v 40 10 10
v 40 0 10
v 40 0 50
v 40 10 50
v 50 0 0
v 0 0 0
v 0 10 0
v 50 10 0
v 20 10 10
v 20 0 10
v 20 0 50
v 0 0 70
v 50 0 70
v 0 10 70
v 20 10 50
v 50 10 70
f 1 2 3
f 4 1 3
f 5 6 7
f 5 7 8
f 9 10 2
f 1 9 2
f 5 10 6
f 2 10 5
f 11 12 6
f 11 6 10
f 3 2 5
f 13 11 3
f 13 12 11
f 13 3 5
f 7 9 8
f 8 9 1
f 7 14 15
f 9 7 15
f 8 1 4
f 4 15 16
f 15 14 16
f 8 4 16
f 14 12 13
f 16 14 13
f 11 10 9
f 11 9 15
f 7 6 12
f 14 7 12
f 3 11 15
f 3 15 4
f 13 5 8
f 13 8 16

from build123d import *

# Parameters (mm, degrees)
F0_W     = 50
F0_H     = 70
F0_W_2   = 20
F0_H_2   = 40
F1_DEPTH = 10


with BuildPart() as f1:
    # F0 (on Front) → F1 (new body)
    with BuildSketch(Plane.XZ):
        with Locations((25, 35)):
            Rectangle(F0_W, F0_H)
        with Locations((30, 30)):
            Rectangle(F0_W_2, F0_H_2, mode=Mode.SUBTRACT)
    extrude(amount=-F1_DEPTH)


solid = f1.part
